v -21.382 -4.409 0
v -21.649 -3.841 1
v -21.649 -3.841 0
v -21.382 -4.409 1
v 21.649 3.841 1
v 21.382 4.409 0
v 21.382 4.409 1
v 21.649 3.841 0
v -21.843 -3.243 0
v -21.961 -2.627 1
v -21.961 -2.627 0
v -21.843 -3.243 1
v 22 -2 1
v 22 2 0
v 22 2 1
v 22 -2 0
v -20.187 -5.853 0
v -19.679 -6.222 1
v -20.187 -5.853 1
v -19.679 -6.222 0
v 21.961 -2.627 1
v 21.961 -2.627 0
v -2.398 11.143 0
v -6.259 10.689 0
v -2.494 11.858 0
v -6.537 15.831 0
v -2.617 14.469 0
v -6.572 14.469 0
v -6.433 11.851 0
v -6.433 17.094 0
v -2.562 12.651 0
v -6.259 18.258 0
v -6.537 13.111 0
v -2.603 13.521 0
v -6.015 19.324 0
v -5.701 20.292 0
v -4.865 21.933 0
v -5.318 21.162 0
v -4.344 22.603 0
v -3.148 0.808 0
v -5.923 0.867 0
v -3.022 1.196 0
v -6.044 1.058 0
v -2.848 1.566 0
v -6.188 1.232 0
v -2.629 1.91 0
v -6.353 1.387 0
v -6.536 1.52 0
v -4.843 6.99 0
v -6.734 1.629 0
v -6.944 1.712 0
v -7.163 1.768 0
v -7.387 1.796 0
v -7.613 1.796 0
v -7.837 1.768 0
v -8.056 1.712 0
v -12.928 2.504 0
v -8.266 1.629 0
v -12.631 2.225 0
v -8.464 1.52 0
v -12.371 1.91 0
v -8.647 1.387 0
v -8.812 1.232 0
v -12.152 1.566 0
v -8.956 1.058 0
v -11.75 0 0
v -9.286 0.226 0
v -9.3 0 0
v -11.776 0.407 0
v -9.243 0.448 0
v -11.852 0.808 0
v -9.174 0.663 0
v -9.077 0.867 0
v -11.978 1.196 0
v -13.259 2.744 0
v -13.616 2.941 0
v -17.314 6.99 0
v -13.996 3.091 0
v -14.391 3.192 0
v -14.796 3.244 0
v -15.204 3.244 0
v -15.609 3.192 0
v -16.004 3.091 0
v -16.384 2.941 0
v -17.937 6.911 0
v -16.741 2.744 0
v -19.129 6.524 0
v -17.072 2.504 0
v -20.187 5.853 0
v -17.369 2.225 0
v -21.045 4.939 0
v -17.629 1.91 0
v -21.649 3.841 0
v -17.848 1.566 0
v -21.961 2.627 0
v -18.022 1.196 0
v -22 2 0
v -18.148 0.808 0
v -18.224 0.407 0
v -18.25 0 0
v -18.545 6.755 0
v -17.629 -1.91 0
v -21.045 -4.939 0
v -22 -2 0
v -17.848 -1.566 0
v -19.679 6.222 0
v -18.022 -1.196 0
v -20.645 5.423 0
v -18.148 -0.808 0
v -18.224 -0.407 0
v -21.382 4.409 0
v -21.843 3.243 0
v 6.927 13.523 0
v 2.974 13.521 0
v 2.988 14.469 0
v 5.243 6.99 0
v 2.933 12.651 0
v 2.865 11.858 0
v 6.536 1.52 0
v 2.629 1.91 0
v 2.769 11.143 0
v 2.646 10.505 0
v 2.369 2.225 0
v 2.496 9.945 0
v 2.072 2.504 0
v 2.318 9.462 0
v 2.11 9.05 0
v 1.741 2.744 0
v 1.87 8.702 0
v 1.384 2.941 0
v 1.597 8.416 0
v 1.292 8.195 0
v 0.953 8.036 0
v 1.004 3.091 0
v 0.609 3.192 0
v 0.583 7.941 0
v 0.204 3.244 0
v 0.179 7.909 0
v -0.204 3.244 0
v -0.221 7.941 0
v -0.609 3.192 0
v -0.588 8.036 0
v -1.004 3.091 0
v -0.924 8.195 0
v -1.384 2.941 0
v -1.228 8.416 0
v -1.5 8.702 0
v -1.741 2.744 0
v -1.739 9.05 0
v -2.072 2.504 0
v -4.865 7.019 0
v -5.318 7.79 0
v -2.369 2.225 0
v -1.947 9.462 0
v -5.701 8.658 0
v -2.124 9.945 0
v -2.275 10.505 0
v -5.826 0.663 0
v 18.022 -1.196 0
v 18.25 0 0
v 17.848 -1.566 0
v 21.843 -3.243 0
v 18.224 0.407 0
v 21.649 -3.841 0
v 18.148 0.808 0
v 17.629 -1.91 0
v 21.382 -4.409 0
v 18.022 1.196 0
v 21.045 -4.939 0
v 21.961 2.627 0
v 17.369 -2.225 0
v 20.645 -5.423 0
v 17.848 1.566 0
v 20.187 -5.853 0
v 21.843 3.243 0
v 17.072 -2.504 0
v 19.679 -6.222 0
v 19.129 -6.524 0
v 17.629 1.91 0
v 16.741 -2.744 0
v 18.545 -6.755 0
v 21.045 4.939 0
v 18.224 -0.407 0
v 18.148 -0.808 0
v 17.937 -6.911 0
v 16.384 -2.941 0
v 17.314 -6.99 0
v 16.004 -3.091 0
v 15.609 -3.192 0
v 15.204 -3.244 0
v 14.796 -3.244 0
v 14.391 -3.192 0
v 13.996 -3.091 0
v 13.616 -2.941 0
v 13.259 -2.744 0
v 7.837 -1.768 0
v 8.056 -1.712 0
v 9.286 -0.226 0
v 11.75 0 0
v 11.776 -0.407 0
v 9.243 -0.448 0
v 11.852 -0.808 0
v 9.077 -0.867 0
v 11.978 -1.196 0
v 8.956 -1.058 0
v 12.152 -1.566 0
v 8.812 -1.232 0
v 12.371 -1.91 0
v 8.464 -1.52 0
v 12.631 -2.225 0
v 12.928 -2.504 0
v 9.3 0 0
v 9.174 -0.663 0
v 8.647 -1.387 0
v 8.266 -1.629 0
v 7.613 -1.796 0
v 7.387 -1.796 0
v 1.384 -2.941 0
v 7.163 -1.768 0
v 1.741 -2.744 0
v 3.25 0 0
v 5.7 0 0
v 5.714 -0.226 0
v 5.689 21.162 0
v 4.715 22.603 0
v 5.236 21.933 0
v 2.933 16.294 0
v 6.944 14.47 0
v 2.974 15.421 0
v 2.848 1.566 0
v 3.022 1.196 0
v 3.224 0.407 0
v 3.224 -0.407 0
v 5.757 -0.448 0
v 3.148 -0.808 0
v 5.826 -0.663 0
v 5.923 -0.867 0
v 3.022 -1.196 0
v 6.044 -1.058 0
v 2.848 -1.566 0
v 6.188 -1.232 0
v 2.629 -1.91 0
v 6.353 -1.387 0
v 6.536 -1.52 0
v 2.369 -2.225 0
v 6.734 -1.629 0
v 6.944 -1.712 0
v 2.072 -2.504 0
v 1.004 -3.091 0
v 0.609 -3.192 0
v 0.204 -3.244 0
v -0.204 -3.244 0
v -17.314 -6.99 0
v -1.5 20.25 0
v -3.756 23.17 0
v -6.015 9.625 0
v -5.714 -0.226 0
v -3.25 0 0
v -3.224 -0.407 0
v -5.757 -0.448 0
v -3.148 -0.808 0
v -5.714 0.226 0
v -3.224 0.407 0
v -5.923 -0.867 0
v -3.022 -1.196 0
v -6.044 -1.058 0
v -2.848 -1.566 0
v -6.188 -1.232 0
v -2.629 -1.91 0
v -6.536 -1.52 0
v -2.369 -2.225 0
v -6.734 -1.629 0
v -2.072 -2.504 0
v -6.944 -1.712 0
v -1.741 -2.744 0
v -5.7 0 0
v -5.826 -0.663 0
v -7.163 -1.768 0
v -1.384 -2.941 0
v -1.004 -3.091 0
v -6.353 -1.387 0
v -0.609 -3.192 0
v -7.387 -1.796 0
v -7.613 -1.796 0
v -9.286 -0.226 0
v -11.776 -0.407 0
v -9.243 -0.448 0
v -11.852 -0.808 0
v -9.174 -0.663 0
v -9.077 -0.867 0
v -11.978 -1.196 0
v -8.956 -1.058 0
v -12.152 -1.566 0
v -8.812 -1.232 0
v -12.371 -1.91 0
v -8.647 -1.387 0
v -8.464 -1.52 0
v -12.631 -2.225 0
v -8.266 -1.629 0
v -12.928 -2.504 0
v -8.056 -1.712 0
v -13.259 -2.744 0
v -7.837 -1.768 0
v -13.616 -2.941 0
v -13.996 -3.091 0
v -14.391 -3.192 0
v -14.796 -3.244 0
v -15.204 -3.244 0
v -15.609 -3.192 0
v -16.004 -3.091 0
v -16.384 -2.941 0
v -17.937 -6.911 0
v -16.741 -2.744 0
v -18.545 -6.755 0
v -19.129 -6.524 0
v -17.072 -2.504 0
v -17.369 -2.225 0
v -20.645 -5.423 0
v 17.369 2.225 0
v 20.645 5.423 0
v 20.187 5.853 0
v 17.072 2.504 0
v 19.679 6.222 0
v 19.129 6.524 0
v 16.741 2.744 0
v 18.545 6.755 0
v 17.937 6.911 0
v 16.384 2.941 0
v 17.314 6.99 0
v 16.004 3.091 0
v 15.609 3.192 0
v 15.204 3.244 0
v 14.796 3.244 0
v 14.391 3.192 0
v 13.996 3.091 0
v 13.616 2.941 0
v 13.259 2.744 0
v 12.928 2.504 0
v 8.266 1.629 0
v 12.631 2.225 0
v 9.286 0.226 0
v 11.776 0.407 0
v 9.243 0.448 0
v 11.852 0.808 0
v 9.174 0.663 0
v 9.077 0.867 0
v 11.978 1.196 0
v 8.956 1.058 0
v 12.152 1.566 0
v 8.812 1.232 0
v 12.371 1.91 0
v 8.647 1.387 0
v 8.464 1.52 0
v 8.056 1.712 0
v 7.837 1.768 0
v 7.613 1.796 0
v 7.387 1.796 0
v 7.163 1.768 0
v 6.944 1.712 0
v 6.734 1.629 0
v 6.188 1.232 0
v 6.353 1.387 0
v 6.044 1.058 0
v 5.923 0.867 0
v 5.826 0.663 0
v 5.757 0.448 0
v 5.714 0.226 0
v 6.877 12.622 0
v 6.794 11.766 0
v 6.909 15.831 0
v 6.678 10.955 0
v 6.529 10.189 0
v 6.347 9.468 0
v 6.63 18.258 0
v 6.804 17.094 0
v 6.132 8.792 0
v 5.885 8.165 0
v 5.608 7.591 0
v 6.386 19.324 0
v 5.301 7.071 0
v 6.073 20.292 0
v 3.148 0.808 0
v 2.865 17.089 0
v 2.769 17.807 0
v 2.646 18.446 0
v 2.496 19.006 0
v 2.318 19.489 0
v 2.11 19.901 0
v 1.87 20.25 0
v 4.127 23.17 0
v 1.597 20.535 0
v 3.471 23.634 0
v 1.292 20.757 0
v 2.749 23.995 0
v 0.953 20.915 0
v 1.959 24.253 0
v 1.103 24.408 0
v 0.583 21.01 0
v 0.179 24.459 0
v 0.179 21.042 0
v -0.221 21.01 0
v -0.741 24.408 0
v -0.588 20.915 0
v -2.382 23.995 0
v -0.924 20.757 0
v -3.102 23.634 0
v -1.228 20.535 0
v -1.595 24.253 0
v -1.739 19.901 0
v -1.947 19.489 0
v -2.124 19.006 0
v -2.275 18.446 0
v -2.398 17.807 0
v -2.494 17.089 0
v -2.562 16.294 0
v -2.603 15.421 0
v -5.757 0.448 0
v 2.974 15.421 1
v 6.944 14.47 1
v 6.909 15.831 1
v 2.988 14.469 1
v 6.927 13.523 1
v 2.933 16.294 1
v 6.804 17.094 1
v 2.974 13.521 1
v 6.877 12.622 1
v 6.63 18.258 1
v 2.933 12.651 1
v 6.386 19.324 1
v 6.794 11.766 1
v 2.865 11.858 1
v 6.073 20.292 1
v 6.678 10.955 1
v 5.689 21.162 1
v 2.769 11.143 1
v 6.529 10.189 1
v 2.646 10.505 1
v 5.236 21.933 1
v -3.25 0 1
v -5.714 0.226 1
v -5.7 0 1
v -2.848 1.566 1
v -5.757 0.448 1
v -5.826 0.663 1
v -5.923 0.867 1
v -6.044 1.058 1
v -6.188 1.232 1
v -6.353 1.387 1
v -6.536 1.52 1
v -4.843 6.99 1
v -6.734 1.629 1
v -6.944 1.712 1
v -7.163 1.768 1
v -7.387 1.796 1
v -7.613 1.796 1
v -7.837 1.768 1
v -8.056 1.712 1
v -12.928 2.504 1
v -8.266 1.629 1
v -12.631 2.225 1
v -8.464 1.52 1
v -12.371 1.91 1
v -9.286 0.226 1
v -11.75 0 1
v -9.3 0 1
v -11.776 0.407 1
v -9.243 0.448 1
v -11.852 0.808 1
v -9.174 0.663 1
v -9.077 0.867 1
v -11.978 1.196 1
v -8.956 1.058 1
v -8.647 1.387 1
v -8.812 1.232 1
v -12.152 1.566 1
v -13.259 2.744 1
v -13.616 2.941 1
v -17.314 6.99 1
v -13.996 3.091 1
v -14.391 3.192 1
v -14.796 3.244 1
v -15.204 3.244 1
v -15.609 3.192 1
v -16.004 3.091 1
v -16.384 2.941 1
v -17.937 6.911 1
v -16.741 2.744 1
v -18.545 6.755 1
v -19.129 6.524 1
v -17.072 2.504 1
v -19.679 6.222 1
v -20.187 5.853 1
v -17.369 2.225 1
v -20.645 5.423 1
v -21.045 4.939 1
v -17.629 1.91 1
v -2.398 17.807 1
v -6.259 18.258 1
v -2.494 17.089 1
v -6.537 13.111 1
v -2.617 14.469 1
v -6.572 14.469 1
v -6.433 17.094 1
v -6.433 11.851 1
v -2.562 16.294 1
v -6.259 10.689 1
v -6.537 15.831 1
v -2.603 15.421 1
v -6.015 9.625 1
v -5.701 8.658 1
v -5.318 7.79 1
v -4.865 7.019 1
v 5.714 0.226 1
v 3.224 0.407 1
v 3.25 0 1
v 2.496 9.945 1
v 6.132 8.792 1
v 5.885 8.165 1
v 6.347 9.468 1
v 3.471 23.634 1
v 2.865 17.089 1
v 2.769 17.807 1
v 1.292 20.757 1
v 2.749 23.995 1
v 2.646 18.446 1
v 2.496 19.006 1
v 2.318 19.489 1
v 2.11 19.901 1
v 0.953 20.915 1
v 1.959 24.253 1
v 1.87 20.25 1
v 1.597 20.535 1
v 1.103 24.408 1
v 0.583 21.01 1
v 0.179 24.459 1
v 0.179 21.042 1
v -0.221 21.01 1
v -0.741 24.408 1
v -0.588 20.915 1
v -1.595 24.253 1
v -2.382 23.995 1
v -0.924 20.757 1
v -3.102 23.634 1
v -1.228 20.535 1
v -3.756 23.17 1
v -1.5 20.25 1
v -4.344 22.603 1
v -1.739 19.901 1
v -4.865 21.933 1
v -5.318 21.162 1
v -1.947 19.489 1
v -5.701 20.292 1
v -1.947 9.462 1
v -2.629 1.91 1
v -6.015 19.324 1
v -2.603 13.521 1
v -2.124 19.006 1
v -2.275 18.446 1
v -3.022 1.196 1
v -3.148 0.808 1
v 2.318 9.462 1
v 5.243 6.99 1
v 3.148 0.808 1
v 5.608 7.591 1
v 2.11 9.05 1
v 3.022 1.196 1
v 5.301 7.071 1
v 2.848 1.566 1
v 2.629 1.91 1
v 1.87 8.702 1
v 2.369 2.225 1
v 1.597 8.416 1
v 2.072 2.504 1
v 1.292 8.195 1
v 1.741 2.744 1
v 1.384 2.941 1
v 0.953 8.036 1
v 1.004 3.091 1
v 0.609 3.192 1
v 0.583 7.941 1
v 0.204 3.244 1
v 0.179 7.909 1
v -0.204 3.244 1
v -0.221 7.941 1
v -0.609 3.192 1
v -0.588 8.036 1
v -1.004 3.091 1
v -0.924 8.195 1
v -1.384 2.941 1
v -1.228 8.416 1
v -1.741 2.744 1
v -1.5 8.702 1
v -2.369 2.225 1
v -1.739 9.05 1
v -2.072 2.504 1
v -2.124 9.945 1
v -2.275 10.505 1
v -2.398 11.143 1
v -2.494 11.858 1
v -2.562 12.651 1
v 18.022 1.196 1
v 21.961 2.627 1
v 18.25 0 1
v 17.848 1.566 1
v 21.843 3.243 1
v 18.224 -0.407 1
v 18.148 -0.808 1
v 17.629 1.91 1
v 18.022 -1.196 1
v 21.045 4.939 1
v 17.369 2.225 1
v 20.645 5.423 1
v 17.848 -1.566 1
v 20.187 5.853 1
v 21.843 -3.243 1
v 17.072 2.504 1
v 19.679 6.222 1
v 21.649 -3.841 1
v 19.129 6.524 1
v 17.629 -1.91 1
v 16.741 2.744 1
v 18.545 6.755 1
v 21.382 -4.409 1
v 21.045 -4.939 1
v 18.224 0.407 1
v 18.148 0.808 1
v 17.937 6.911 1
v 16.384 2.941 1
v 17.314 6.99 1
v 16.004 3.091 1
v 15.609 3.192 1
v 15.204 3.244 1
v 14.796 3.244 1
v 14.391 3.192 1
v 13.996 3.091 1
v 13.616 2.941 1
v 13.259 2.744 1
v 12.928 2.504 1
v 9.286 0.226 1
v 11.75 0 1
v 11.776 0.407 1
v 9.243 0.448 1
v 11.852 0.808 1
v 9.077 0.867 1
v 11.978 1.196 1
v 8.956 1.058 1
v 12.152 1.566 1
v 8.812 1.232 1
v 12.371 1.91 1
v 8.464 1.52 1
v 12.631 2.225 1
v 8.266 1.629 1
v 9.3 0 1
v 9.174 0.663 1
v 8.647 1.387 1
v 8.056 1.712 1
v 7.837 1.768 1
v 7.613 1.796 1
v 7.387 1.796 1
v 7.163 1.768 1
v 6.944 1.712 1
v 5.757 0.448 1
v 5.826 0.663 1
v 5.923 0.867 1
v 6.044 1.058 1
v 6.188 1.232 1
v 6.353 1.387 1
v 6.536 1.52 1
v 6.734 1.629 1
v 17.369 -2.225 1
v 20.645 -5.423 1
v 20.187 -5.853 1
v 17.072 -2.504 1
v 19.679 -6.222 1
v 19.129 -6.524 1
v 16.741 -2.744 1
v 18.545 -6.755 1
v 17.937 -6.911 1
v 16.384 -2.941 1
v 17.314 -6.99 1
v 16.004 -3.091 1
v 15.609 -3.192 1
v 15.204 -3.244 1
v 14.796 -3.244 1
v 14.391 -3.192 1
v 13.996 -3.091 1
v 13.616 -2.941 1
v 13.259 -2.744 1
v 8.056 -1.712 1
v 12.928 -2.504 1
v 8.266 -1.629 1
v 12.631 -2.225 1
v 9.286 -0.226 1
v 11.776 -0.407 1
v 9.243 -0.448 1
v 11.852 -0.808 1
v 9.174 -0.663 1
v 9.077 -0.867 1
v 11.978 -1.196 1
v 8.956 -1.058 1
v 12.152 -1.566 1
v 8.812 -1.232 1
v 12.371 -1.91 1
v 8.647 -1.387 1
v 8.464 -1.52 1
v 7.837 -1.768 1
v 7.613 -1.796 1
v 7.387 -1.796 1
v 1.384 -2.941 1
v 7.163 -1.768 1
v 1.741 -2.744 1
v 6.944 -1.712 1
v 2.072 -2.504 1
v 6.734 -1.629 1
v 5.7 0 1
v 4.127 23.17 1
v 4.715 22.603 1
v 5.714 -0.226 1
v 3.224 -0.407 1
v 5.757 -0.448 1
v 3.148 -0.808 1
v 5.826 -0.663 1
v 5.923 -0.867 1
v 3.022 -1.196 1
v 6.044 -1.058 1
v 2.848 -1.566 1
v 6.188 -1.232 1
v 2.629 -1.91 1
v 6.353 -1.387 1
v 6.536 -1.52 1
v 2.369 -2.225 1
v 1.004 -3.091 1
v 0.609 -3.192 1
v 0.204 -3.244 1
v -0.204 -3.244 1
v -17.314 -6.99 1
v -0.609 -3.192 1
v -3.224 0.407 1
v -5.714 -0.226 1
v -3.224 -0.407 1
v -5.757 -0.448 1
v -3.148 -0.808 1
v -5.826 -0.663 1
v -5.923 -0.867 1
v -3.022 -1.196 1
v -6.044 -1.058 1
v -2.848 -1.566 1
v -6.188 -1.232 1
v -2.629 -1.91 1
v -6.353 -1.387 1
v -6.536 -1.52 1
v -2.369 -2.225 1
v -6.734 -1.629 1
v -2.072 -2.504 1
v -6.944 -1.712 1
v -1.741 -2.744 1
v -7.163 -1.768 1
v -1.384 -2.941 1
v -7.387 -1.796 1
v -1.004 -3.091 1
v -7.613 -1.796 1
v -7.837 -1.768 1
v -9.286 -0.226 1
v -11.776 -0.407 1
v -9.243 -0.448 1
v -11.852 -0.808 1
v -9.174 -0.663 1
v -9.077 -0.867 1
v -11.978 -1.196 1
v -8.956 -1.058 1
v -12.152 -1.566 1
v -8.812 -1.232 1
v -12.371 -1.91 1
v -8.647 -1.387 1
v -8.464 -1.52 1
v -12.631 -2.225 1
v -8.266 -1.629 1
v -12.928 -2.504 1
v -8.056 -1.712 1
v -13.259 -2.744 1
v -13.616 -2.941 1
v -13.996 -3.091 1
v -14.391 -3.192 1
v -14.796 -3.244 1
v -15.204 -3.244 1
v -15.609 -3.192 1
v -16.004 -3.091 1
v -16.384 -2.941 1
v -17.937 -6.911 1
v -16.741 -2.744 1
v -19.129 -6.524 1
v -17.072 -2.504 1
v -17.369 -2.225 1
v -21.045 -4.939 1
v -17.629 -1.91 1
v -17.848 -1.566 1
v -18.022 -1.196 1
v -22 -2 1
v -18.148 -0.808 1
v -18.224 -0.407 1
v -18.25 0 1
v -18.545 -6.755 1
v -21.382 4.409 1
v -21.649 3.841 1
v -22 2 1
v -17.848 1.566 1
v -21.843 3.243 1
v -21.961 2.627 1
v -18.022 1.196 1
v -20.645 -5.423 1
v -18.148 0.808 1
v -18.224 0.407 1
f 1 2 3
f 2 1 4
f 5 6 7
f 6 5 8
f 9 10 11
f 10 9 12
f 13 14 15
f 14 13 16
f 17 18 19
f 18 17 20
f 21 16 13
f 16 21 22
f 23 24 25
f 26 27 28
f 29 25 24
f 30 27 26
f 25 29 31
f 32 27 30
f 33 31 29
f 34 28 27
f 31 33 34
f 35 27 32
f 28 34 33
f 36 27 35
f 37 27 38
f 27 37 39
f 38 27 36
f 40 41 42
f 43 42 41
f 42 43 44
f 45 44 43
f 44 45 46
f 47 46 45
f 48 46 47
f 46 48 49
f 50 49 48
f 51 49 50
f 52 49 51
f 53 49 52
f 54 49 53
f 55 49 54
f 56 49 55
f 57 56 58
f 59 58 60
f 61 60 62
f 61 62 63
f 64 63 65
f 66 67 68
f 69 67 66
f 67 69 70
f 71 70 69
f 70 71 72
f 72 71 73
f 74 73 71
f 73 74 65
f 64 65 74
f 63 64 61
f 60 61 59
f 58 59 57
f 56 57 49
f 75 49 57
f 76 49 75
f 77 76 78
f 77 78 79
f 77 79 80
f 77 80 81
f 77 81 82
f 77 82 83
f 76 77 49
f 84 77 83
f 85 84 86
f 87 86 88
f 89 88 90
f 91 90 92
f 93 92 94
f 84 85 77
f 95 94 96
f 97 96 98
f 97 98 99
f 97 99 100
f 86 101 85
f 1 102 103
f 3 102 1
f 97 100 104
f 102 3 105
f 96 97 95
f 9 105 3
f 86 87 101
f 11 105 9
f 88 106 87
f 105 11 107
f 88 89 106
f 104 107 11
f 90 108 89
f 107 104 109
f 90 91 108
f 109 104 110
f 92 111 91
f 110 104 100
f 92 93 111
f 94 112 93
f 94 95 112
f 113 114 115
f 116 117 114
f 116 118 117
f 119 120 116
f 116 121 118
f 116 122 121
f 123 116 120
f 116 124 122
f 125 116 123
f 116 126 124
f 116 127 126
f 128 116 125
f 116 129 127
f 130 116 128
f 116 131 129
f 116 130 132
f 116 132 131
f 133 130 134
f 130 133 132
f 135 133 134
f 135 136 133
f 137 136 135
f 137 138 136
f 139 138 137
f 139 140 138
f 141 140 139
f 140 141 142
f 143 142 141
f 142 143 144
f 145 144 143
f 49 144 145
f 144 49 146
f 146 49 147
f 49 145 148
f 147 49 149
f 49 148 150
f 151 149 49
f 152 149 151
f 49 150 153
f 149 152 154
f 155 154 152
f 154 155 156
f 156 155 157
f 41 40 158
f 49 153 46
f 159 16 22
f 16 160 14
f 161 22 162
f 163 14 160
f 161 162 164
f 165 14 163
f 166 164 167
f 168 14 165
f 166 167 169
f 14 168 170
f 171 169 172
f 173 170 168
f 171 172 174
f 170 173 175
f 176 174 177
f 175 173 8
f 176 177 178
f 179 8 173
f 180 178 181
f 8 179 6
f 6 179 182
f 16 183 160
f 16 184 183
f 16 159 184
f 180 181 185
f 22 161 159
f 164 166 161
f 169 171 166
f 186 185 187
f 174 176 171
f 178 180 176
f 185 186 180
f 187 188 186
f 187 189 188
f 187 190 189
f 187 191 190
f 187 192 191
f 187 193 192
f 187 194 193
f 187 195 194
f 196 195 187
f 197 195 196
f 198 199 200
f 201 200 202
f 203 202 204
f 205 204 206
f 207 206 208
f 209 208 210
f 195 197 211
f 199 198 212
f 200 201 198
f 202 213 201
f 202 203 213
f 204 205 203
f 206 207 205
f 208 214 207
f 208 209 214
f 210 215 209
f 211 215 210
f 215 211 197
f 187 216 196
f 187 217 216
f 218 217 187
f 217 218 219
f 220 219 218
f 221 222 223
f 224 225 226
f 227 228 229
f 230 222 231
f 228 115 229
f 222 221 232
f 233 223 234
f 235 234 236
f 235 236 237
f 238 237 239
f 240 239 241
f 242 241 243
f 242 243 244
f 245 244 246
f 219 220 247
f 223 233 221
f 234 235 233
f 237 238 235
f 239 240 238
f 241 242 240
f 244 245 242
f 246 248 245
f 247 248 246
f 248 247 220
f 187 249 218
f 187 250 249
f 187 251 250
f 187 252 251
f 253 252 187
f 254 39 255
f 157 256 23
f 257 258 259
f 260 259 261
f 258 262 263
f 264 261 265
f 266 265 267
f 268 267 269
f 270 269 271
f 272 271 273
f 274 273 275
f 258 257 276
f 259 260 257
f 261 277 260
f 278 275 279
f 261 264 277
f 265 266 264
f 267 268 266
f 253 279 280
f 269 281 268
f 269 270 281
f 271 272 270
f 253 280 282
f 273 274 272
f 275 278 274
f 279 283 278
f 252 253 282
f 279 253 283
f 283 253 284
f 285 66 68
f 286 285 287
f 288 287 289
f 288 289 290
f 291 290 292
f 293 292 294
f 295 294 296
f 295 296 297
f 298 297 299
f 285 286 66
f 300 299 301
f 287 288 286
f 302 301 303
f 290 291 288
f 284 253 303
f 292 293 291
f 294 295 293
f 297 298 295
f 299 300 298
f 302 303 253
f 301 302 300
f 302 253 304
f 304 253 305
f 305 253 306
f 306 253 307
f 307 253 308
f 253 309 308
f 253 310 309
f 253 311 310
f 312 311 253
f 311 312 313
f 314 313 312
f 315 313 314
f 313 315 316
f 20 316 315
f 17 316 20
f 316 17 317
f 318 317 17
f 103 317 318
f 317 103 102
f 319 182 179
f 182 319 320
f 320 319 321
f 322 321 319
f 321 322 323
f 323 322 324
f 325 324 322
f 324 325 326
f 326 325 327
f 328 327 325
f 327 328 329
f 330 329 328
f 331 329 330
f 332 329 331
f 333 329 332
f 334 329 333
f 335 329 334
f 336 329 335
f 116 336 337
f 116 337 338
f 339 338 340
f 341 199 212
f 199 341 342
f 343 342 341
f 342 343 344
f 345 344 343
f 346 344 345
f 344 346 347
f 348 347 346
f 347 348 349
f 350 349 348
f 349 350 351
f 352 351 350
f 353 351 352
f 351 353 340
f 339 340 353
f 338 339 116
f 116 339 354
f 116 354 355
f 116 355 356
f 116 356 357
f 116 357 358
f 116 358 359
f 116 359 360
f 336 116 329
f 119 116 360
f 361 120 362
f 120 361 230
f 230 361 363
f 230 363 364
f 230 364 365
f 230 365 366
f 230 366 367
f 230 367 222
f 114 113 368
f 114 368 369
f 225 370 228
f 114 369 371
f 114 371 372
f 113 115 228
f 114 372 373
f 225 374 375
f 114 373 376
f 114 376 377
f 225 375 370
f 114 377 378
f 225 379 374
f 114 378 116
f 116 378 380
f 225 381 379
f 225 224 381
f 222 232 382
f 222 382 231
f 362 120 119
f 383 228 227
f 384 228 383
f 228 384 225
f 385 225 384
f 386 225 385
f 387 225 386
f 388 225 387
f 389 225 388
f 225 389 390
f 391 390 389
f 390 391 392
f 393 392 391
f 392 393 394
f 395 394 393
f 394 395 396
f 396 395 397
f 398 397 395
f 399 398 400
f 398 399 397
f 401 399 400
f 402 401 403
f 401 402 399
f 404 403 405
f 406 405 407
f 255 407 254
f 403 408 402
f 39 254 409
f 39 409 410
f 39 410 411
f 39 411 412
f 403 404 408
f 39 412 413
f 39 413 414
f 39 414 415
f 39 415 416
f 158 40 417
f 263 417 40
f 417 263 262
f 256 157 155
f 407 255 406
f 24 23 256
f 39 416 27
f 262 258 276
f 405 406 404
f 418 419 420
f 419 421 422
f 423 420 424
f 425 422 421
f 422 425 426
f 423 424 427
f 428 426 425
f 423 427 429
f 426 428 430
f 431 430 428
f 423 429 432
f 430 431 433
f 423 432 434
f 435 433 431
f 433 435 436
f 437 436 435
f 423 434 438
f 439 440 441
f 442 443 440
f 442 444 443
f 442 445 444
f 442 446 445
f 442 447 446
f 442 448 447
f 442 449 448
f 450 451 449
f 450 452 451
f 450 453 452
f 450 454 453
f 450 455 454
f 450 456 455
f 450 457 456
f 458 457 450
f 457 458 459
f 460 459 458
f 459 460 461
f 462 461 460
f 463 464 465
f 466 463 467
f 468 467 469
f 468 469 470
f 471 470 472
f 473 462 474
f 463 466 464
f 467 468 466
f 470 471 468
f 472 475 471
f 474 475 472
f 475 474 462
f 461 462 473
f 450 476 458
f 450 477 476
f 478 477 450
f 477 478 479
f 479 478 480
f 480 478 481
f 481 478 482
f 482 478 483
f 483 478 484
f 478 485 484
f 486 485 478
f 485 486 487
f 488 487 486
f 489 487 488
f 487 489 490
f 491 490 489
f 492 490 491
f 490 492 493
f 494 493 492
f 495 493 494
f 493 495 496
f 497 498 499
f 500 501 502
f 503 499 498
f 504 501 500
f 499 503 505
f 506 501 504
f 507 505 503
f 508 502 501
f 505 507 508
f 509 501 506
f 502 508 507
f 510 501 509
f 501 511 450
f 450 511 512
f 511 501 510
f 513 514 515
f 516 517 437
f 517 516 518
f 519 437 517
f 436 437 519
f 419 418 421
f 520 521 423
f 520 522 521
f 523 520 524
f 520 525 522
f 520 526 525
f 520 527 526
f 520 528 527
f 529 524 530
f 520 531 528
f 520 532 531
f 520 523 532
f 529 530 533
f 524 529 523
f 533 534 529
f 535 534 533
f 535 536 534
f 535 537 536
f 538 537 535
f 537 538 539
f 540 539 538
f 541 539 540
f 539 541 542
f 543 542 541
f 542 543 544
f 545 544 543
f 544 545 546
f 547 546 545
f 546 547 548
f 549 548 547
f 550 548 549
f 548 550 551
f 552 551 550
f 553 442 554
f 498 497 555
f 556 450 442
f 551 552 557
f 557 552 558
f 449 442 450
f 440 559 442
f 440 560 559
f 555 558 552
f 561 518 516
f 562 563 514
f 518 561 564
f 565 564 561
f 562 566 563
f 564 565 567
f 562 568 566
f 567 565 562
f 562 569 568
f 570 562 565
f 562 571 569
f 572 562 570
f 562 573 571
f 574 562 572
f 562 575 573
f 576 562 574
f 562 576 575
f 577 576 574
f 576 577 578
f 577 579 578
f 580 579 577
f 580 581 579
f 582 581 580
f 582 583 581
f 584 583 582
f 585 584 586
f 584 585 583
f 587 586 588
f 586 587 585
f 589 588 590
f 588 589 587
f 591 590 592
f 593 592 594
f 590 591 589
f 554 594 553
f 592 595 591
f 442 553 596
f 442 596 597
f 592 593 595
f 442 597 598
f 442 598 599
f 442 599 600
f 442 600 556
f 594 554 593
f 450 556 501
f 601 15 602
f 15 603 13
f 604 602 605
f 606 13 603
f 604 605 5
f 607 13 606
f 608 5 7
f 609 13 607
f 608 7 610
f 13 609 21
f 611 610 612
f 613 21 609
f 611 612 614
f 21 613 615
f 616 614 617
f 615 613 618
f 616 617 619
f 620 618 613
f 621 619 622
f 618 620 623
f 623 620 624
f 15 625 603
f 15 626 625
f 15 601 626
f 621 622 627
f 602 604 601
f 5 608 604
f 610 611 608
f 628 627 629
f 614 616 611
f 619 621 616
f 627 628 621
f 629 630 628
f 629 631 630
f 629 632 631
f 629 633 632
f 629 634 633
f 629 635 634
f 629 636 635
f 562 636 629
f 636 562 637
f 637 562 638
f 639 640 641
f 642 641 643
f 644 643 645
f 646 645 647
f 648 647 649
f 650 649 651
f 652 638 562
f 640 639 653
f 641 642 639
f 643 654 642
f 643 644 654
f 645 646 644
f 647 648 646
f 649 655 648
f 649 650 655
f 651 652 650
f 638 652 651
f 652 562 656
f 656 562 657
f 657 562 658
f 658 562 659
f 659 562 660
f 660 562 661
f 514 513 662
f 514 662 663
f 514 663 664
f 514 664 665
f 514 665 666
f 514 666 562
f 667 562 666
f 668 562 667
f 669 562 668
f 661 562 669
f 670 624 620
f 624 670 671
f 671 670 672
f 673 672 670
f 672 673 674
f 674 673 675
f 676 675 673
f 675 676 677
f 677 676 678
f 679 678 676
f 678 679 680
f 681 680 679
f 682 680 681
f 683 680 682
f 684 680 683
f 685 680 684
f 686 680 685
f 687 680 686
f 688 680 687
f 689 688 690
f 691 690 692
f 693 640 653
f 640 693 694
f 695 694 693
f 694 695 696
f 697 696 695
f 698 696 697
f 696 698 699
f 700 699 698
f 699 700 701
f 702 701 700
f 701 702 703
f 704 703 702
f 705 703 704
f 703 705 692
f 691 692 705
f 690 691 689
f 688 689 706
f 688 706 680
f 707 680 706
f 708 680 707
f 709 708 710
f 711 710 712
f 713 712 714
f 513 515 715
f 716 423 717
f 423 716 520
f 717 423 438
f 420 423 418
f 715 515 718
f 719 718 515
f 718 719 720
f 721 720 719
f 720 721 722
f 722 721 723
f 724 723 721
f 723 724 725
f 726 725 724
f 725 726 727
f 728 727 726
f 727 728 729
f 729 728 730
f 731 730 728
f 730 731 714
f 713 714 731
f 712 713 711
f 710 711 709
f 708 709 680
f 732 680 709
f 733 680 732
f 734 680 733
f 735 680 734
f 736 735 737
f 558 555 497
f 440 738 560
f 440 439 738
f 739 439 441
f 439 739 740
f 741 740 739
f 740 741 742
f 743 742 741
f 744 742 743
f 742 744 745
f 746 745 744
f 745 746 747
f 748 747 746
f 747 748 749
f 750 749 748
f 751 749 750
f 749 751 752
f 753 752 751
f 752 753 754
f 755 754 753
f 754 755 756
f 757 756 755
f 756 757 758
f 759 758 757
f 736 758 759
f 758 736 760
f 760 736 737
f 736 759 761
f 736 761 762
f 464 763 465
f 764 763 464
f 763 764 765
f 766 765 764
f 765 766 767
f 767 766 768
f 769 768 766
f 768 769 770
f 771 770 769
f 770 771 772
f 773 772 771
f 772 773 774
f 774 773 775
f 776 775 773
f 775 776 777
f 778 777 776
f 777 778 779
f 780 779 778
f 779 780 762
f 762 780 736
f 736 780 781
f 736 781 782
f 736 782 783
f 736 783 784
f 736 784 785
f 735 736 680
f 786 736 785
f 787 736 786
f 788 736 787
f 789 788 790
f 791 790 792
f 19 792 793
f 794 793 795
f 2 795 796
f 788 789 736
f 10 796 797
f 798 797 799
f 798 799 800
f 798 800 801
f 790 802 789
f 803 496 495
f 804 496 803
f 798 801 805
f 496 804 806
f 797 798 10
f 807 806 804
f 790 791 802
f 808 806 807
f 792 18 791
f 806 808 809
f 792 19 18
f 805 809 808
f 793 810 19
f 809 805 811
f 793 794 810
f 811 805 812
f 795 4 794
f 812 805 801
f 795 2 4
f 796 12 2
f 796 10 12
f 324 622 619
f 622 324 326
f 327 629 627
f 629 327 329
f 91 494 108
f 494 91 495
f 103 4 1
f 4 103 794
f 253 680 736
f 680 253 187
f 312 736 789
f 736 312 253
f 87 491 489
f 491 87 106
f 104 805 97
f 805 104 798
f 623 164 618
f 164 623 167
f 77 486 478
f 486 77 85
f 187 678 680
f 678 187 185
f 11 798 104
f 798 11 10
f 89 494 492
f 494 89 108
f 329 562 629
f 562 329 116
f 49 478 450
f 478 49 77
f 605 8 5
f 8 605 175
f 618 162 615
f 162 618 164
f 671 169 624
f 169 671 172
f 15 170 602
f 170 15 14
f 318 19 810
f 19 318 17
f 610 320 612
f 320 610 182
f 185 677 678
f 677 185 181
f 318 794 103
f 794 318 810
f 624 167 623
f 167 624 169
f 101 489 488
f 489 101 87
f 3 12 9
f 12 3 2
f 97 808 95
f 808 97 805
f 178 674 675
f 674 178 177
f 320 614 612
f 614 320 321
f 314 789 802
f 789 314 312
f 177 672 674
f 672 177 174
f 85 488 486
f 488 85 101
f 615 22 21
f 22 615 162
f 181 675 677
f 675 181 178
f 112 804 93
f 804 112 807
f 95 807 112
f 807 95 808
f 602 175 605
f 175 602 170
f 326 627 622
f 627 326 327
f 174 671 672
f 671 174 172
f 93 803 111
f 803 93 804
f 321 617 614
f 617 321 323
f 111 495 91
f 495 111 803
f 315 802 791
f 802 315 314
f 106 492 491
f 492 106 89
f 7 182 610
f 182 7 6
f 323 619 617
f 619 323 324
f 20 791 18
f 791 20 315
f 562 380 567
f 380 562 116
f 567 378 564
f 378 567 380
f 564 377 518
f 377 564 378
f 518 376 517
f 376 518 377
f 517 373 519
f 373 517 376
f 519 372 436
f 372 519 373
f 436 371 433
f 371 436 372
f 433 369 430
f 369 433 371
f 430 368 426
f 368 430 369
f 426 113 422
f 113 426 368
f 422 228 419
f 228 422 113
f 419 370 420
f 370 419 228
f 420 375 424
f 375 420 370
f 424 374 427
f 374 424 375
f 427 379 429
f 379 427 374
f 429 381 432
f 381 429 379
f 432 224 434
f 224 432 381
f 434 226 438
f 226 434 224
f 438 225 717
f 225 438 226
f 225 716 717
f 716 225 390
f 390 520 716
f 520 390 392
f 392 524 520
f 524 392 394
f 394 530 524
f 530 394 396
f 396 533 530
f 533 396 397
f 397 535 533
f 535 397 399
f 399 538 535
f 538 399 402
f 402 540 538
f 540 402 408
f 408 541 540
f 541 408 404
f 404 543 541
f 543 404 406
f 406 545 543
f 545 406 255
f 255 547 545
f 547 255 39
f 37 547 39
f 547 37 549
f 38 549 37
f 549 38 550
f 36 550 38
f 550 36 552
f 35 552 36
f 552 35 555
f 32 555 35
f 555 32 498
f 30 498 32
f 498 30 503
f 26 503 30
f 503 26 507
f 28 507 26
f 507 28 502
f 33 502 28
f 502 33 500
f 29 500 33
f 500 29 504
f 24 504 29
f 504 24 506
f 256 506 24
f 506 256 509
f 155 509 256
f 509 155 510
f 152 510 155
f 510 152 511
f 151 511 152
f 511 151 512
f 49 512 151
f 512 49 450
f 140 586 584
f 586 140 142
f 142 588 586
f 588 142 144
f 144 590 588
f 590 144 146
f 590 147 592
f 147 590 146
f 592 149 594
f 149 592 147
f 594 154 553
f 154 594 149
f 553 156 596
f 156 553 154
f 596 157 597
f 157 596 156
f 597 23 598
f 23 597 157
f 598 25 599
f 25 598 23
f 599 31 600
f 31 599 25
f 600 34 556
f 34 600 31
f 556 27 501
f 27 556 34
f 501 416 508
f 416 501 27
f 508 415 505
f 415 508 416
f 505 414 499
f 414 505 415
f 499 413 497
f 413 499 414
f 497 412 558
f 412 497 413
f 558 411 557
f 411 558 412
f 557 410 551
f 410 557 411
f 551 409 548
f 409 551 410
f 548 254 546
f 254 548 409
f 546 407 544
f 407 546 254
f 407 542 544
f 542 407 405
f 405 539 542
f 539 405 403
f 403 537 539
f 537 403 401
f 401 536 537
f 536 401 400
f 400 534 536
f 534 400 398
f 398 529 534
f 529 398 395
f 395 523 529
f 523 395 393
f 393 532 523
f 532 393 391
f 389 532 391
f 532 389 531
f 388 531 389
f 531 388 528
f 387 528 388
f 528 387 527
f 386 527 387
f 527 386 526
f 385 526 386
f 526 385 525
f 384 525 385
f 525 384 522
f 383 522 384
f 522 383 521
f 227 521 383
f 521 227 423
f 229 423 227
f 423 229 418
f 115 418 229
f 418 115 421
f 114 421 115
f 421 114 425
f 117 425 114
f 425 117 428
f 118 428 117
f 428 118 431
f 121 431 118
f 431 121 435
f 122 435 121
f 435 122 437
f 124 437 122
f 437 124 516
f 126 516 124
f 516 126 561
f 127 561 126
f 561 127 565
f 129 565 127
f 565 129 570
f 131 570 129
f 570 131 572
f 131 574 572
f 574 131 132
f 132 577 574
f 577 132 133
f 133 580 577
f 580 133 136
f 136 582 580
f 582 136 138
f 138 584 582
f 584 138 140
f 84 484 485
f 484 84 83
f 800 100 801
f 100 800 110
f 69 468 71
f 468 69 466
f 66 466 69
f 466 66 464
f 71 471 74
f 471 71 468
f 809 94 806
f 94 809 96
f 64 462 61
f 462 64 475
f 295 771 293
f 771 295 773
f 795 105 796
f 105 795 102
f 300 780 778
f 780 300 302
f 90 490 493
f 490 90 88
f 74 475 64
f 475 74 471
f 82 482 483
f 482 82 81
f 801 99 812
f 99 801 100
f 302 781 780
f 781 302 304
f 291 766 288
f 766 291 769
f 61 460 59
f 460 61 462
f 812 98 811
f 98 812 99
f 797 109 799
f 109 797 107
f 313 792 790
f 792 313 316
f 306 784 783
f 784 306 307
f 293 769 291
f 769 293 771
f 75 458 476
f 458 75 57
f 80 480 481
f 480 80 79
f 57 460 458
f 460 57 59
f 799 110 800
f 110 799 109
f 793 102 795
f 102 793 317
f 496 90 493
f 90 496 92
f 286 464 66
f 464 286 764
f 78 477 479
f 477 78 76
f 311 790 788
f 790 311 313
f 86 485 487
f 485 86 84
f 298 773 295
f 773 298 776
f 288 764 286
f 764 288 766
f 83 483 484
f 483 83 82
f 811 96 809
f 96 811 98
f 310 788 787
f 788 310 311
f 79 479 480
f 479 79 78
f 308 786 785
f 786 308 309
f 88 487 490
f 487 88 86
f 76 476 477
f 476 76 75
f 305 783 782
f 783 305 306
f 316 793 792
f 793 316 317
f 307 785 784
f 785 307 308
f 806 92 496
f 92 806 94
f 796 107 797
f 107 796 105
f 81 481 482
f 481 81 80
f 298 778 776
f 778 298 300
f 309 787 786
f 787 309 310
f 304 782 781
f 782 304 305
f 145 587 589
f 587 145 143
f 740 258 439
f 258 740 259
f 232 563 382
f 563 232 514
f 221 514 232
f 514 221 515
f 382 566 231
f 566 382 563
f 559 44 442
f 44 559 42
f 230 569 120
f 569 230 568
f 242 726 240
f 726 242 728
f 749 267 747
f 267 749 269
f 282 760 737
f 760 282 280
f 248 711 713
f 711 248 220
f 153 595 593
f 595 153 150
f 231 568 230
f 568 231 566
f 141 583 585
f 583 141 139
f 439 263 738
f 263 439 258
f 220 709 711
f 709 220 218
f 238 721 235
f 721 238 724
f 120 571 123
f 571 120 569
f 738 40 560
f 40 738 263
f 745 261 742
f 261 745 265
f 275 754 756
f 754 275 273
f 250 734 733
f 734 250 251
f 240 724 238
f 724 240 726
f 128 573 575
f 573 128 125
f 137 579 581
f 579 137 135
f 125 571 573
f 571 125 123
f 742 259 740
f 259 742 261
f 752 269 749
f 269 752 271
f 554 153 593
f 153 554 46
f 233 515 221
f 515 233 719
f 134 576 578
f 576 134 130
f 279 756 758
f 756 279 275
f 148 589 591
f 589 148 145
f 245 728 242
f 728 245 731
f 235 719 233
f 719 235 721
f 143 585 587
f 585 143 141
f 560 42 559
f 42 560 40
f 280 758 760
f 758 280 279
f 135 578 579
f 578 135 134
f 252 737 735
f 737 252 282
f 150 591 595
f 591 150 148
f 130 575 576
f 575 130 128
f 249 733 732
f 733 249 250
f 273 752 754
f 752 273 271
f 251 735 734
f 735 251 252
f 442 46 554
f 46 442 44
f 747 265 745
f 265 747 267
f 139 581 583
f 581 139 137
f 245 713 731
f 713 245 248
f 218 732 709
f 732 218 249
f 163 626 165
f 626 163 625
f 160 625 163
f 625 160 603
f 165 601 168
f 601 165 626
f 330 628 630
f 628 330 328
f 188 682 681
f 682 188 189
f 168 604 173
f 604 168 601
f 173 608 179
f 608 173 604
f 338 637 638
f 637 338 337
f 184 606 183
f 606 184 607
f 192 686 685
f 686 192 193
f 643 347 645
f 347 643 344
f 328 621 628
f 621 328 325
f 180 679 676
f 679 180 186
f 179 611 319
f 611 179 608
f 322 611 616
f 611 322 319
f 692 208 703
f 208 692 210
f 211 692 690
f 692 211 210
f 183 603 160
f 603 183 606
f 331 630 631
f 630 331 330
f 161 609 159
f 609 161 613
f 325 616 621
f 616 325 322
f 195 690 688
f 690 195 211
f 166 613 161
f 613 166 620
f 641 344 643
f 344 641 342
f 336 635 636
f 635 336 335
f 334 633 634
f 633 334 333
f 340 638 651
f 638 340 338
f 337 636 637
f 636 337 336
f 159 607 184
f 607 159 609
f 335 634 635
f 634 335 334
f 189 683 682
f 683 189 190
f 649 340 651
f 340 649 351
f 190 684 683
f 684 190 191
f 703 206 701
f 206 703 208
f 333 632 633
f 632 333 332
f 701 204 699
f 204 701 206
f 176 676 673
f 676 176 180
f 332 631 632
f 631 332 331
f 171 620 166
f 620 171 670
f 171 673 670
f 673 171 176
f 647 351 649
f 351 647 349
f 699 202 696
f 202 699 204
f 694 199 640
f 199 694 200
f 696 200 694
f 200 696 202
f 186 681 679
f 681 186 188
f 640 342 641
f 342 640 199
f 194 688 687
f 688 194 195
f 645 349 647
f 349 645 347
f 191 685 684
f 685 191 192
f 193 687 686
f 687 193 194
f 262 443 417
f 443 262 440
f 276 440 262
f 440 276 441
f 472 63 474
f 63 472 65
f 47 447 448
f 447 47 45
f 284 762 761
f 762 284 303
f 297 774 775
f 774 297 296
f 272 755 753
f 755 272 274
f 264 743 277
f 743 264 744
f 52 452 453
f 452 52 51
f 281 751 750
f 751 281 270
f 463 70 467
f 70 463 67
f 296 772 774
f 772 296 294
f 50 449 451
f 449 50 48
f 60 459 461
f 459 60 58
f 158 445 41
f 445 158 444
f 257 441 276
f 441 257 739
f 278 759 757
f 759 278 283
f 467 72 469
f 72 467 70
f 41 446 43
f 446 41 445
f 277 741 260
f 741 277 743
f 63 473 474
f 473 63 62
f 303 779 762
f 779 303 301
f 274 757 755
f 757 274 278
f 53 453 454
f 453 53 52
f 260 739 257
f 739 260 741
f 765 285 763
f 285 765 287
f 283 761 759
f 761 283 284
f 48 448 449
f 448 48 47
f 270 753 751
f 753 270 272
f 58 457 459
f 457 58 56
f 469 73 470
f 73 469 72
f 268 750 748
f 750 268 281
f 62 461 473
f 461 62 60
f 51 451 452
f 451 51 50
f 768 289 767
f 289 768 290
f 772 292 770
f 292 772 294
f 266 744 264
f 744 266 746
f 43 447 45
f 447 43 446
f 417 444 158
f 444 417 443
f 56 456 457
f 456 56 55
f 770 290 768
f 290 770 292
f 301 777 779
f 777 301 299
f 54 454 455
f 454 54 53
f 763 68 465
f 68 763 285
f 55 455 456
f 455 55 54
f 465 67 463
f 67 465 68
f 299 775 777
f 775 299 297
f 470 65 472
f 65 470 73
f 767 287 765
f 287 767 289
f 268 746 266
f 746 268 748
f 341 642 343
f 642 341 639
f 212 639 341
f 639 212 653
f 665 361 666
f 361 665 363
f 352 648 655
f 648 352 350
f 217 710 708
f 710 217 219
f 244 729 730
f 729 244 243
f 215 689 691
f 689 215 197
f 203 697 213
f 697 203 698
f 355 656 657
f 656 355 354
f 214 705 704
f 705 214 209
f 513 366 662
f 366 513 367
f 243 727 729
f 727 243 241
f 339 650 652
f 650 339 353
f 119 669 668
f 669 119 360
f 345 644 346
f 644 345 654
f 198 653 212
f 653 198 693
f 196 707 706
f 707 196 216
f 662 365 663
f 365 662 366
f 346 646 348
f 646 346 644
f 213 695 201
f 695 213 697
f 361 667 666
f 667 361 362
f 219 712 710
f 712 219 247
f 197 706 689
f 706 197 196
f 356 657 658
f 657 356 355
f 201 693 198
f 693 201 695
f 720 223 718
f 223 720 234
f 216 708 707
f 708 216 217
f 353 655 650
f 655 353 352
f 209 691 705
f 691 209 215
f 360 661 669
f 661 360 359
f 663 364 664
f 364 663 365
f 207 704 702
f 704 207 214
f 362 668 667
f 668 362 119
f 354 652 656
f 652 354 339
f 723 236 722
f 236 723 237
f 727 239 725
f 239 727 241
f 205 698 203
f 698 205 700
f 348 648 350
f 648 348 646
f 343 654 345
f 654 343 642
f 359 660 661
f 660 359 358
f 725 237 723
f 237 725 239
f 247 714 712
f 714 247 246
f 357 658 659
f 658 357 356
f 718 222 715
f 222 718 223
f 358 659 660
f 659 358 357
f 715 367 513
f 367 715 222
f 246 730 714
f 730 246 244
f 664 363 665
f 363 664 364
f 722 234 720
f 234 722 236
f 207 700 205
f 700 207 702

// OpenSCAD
$fn = 50;


difference() {
	union() {
		hull() {
			translate(v = [-17.0000000000, 2.0000000000, 0]) {
				cylinder(h = 1, r = 5);
			}
			translate(v = [17.0000000000, 2.0000000000, 0]) {
				cylinder(h = 1, r = 5);
			}
			translate(v = [-17.0000000000, -2.0000000000, 0]) {
				cylinder(h = 1, r = 5);
			}
			translate(v = [17.0000000000, -2.0000000000, 0]) {
				cylinder(h = 1, r = 5);
			}
		}
		translate(v = [0, 24, 0]) {
			linear_extrude(height = 1) {
				text(font = "DejaVu Sans Mono:style=Bold", halign = "center", size = 19.0000000000, text = "Q", valign = "top");
			}
		}
	}
	union() {
		translate(v = [-15.0000000000, 0.0000000000, 0]) {
			translate(v = [0, 0, -100]) {
				cylinder(h = 200, r = 3.2500000000);
			}
		}
		translate(v = [0, 0, -100]) {
			cylinder(h = 200, r = 3.2500000000);
		}
		translate(v = [15.0000000000, 0.0000000000, 0]) {
			translate(v = [0, 0, -100]) {
				cylinder(h = 200, r = 3.2500000000);
			}
		}
		translate(v = [-15.0000000000, 0.0000000000, 0]) {
			translate(v = [0, 0, -100]) {
				cylinder(h = 200, r = 1.8000000000);
			}
		}
		translate(v = [-7.5000000000, 0.0000000000, 0]) {
			translate(v = [0, 0, -100]) {
				cylinder(h = 200, r = 1.8000000000);
			}
		}
		translate(v = [0, 0, -100]) {
			cylinder(h = 200, r = 1.8000000000);
		}
		translate(v = [7.5000000000, 0.0000000000, 0]) {
			translate(v = [0, 0, -100]) {
				cylinder(h = 200, r = 1.8000000000);
			}
		}
		translate(v = [15.0000000000, 0.0000000000, 0]) {
			translate(v = [0, 0, -100]) {
				cylinder(h = 200, r = 1.8000000000);
			}
		}
	}
}
